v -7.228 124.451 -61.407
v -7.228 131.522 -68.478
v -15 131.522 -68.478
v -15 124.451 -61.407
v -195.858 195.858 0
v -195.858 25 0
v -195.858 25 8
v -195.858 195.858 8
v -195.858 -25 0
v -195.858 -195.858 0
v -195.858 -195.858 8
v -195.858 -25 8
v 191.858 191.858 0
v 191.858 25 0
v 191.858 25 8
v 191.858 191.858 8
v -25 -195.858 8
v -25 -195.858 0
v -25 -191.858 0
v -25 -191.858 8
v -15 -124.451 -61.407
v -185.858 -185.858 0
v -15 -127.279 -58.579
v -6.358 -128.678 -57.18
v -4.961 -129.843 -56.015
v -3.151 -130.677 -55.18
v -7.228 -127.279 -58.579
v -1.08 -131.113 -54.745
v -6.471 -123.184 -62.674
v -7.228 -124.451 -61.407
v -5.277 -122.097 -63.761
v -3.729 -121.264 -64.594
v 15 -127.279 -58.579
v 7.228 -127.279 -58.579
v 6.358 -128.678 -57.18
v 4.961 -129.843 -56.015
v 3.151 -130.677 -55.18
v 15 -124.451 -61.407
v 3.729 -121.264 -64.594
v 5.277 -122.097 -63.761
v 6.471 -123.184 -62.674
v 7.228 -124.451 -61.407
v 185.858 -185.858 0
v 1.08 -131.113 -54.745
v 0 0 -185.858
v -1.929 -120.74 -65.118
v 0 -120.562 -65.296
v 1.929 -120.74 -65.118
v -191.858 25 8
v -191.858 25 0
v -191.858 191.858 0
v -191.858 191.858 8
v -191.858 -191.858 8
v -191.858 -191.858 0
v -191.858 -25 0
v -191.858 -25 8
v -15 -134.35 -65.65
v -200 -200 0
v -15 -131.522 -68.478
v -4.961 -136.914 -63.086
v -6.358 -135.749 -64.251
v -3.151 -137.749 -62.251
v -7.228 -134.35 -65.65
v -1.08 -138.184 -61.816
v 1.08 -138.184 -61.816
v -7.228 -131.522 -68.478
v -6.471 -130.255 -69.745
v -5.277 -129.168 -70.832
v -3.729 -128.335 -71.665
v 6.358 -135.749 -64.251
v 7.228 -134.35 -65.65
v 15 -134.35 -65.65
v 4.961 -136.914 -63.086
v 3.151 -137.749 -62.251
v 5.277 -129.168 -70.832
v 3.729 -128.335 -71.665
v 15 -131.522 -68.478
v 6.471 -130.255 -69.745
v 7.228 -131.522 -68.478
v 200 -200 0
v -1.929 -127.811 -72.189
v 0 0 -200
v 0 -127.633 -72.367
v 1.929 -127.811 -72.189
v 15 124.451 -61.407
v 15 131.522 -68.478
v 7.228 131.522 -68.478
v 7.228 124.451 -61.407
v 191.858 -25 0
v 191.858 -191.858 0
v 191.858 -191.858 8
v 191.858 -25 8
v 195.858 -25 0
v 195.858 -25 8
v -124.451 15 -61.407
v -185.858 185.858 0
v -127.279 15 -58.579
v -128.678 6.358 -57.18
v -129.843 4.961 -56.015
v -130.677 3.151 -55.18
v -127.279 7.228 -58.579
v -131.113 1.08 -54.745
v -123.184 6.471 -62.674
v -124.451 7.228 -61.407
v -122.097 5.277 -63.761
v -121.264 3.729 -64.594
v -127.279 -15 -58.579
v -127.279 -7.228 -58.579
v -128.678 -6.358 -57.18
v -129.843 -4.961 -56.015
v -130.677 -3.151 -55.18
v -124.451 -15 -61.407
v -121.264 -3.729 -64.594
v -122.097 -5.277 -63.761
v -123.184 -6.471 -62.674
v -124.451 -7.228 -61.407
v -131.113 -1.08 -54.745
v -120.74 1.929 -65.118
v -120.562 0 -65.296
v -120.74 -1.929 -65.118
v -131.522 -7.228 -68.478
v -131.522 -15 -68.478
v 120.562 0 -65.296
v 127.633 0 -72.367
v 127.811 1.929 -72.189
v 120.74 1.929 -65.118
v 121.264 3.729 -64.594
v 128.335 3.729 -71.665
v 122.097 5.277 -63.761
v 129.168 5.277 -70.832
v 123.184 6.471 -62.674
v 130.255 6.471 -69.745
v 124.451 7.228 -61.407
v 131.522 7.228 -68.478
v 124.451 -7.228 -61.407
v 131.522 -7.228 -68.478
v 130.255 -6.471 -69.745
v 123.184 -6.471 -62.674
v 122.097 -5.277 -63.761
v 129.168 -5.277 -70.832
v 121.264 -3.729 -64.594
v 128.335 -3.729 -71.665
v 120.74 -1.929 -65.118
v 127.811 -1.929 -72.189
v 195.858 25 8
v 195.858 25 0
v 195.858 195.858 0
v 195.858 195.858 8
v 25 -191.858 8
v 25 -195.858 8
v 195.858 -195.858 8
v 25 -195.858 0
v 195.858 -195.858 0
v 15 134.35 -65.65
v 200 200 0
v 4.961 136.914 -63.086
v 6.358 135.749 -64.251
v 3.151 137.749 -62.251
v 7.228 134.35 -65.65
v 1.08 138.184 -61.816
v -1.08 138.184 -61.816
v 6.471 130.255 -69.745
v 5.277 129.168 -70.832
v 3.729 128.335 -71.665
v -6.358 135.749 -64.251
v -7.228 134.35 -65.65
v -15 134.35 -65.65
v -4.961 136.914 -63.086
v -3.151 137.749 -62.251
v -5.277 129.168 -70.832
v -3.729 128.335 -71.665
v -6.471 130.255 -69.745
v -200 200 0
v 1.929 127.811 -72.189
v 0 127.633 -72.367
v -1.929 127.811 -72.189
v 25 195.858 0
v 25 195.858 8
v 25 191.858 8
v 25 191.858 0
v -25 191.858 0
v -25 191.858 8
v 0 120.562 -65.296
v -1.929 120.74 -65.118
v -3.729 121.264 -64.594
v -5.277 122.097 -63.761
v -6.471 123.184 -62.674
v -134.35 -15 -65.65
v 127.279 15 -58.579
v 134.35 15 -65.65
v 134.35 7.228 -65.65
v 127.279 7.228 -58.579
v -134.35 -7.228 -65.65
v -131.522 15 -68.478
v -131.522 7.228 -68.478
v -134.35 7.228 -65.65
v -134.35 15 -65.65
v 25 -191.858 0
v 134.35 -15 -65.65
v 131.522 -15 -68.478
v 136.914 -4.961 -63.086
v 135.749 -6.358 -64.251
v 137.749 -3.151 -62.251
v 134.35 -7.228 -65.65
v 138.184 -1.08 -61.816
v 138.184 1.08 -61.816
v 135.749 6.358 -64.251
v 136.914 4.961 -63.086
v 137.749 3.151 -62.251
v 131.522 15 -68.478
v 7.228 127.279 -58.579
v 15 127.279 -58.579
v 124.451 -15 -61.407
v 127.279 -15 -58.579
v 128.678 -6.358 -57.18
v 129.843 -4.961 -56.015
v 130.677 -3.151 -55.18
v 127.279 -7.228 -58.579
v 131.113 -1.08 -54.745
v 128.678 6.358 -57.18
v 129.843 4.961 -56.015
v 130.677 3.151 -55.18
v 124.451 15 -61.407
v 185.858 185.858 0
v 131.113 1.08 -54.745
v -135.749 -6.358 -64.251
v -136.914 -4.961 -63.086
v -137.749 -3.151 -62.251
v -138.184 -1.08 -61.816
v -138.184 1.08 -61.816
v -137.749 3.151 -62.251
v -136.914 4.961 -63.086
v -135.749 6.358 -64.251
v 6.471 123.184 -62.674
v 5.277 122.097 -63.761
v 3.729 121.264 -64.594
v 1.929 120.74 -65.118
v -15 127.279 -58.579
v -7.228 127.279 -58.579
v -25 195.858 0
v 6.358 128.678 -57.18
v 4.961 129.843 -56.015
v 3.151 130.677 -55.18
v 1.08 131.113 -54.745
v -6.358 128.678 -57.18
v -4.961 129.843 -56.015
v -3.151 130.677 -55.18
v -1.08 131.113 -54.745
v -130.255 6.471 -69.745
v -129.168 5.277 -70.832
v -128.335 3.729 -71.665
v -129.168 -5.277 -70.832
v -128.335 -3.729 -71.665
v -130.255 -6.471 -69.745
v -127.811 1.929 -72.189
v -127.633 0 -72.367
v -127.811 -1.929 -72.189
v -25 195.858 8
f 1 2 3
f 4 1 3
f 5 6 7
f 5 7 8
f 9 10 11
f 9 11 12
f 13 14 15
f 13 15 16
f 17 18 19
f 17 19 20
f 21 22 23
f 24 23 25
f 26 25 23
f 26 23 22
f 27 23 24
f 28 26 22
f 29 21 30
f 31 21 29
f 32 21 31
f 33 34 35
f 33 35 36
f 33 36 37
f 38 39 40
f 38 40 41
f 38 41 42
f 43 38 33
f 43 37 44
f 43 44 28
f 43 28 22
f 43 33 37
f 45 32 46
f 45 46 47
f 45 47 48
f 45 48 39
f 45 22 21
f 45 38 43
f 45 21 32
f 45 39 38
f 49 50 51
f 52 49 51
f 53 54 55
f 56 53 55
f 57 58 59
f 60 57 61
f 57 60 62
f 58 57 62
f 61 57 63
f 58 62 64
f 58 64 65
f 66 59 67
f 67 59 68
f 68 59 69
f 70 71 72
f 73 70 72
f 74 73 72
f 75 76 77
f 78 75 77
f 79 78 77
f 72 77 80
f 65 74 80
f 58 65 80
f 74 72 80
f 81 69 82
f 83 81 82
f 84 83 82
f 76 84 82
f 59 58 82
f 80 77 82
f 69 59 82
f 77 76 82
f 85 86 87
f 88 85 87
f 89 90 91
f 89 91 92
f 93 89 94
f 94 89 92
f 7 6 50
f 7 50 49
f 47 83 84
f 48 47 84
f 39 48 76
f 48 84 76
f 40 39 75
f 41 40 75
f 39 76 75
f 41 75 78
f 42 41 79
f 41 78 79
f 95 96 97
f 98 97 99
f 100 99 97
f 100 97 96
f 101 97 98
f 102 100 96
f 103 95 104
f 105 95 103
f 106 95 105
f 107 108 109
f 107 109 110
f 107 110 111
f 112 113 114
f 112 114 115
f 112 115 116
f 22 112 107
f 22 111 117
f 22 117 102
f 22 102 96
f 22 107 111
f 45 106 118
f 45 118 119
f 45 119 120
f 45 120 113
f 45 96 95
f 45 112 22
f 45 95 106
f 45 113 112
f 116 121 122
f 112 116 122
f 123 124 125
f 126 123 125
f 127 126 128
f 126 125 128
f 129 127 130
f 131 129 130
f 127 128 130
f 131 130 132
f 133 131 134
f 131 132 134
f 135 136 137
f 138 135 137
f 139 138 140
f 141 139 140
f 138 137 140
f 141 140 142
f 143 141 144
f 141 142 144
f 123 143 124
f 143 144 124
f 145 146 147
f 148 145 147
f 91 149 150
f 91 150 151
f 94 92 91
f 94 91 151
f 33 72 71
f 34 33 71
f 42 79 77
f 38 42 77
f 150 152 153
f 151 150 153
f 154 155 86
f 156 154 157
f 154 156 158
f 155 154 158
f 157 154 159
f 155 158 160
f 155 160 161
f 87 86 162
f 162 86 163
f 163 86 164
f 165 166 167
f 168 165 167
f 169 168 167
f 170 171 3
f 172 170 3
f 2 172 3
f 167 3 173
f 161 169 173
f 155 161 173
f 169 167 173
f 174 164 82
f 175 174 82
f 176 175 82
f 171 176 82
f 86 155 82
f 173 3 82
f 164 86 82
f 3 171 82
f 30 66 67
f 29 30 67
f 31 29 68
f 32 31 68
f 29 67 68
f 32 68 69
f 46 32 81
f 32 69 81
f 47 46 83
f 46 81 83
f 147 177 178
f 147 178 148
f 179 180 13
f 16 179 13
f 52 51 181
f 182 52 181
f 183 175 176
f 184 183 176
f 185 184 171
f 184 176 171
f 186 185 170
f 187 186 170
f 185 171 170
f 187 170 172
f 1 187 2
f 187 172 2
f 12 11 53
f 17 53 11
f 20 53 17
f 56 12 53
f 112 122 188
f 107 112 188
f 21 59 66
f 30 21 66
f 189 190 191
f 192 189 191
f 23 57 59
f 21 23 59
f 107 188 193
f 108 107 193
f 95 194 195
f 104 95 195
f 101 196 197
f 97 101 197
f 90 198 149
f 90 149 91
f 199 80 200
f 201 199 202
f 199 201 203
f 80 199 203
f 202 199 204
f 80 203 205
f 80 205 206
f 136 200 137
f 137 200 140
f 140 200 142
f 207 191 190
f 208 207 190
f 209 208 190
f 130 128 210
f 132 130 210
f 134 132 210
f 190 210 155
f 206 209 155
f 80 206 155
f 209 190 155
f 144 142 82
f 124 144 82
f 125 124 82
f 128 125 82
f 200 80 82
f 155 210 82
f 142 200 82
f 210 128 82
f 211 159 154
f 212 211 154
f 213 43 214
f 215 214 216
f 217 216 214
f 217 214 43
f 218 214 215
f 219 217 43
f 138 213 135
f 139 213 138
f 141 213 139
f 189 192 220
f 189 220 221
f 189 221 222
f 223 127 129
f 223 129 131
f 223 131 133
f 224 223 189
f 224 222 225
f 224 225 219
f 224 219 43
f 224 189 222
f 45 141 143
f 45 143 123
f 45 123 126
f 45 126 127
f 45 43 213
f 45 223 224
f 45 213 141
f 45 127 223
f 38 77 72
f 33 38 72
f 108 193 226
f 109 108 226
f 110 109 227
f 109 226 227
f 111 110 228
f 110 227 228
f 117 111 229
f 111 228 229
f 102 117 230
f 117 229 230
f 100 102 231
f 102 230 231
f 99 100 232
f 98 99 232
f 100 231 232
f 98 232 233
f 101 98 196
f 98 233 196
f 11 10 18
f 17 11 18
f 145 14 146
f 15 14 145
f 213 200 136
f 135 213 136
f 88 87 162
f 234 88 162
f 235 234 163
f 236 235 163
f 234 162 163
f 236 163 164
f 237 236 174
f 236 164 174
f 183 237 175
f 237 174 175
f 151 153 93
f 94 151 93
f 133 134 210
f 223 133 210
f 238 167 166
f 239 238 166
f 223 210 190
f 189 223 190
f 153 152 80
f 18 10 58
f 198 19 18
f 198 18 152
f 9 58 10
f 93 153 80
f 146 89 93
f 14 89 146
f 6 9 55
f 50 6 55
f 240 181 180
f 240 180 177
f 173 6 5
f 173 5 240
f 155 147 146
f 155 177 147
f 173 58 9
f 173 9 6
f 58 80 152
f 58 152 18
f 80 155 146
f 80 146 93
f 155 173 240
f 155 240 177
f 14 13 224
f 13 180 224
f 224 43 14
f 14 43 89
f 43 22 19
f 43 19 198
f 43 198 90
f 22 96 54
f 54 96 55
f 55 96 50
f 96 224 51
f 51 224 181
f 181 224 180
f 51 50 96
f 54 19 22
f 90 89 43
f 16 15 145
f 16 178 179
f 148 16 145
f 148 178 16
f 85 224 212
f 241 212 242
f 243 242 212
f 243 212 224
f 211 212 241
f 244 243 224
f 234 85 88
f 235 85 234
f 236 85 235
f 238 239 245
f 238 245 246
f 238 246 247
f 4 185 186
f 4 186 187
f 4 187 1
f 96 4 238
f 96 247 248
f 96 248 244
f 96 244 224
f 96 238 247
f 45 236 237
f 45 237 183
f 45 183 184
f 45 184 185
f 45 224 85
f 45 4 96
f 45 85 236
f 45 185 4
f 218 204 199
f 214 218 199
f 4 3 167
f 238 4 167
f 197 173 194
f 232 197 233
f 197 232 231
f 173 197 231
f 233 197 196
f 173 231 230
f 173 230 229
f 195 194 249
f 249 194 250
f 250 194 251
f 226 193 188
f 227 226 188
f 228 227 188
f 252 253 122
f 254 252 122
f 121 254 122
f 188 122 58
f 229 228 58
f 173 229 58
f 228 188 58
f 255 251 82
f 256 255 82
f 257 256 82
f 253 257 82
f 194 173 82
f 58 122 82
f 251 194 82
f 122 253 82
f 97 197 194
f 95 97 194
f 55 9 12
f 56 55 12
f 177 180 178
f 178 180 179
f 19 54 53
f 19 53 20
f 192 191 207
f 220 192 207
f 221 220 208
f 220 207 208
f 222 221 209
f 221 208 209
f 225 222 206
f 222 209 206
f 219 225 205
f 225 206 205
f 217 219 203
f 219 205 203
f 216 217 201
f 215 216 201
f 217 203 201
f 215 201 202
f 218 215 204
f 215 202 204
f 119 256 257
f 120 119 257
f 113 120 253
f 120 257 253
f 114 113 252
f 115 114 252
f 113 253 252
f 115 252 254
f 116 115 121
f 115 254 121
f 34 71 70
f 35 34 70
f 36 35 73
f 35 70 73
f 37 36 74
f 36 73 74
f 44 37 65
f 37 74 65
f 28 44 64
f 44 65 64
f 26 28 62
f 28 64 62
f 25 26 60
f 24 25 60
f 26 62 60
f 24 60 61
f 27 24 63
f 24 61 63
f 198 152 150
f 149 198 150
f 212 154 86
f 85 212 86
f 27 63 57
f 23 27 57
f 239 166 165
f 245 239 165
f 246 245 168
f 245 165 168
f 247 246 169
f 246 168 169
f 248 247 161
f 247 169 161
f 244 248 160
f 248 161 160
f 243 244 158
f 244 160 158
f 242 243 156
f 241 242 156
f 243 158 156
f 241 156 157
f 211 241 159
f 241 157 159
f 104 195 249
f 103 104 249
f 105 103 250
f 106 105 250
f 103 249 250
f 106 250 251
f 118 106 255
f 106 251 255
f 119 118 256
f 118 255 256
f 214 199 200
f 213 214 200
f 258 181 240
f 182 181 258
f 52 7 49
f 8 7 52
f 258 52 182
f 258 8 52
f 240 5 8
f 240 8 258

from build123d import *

# Parameters (mm, degrees)
F0_W      = 400
F0_H      = 400
F3_T      = -10
F4_W      = 391.7157287525
F4_H      = 391.7157287525
F4_W_2    = 383.7157287525
F4_H_2    = 383.7157287525
F5_DEPTH  = 8
F10_DEPTH = 288.5005667948
F11_DEPTH = 288.5005667948
F12_DEPTH = 288.5005667948
F13_DEPTH = 288.5005667948
F14_W     = 25
F14_H     = 8
F15_DEPTH = 395.8588644763
F16_W     = 25
F16_H     = 8
F17_DEPTH = 395.8588644763


with BuildPart() as f2:
    # F0 (on Top) → F2 section 0
    with BuildSketch(Plane.XY, mode=Mode.PRIVATE) as f2_s0:
        Rectangle(F0_W, F0_H)
    loft([f2_s0.sketch, Vertex(0, 0, -200)])

    # F3
    f3_openings = [f2.faces().sort_by_distance(p)[0] for p in [
        (0, 0, 0),
    ]]
    offset(amount=F3_T, openings=f3_openings)

    # F4 (on face) → F5 (join)
    with BuildSketch(Plane.XY):
        Rectangle(F4_W, F4_H)
        Rectangle(F4_W_2, F4_H_2, mode=Mode.SUBTRACT)
    extrude(amount=F5_DEPTH)

    # F6 (on face) → F10 (cut, through all)
    with BuildSketch(Plane(origin=(0, -100, -100), x_dir=(1, 0, 0), z_dir=(0, -0.7071067812, -0.7071067812))):
        with BuildLine():
            ThreePointArc((-7.2284161474, 44.5786437627), (-4.5414755311, 40.6099755695), (0, 39.0786437627))
            Line((0, 39.0786437627), (0, 44.5786437627))
            Line((0, 44.5786437627), (-7.2284161474, 44.5786437627))
        make_face()
        with BuildLine():
            Line((0, 44.5786437627), (0, 39.0786437627))
            ThreePointArc((0, 39.0786437627), (4.5414755311, 40.6099755695), (7.2284161474, 44.5786437627))
            Line((7.2284161474, 44.5786437627), (0, 44.5786437627))
        make_face()
        with BuildLine():
            Line((-7.2284161474, 44.5786437627), (0, 44.5786437627))
            Line((0, 44.5786437627), (0, 46.5786437627))
            Line((0, 46.5786437627), (7.5, 46.5786437627))
            ThreePointArc((7.5, 46.5786437627), (7.4317938987, 47.5878213721), (7.2284161474, 48.5786437627))
            Line((7.2284161474, 48.5786437627), (-7.2284161474, 48.5786437627))
            ThreePointArc((-7.2284161474, 48.5786437627), (-7.5, 46.5786437627), (-7.2284161474, 44.5786437627))
        make_face()
        with BuildLine():
            Line((0, 46.5786437627), (0, 44.5786437627))
            Line((0, 44.5786437627), (7.2284161474, 44.5786437627))
            ThreePointArc((7.2284161474, 44.5786437627), (7.4317938987, 45.5694661533), (7.5, 46.5786437627))
            Line((7.5, 46.5786437627), (0, 46.5786437627))
        make_face()
        with BuildLine():
            Line((-15, 44.5786437627), (-7.2284161474, 44.5786437627))
            ThreePointArc((-7.2284161474, 44.5786437627), (-7.5, 46.5786437627), (-7.2284161474, 48.5786437627))
            Line((-7.2284161474, 48.5786437627), (-15, 48.5786437627))
            Line((-15, 48.5786437627), (-15, 44.5786437627))
        make_face()
        with BuildLine():
            ThreePointArc((7.5, 46.5786437627), (7.4317938987, 45.5694661533), (7.2284161474, 44.5786437627))
            Line((7.2284161474, 44.5786437627), (15, 44.5786437627))
            Line((15, 44.5786437627), (15, 48.5786437627))
            Line((15, 48.5786437627), (7.2284161474, 48.5786437627))
            ThreePointArc((7.2284161474, 48.5786437627), (7.4317938987, 47.5878213721), (7.5, 46.5786437627))
        make_face()
        with BuildLine():
            ThreePointArc((7.2284161474, 48.5786437627), (0, 54.0786437627), (-7.2284161474, 48.5786437627))
            Line((-7.2284161474, 48.5786437627), (7.2284161474, 48.5786437627))
        make_face()
    extrude(amount=-F10_DEPTH, mode=Mode.SUBTRACT)

    # F7 (on face) → F11 (cut, through all)
    with BuildSketch(Plane(origin=(100, 0, -100), x_dir=(0, 1, 0), z_dir=(0.7071067812, 0, -0.7071067812))):
        with BuildLine():
            ThreePointArc((-7.2284161474, 44.5786437627), (-4.5414755311, 40.6099755695), (0, 39.0786437627))
            Line((0, 39.0786437627), (0, 44.5786437627))
            Line((0, 44.5786437627), (-7.2284161474, 44.5786437627))
        make_face()
        with BuildLine():
            Line((0, 44.5786437627), (0, 39.0786437627))
            ThreePointArc((0, 39.0786437627), (4.5414755311, 40.6099755695), (7.2284161474, 44.5786437627))
            Line((7.2284161474, 44.5786437627), (0, 44.5786437627))
        make_face()
        with BuildLine():
            Line((-7.2284161474, 44.5786437627), (0, 44.5786437627))
            Line((0, 44.5786437627), (0, 46.5786437627))
            Line((0, 46.5786437627), (7.5, 46.5786437627))
            ThreePointArc((7.5, 46.5786437627), (7.4317938987, 47.5878213721), (7.2284161474, 48.5786437627))
            Line((7.2284161474, 48.5786437627), (-7.2284161474, 48.5786437627))
            ThreePointArc((-7.2284161474, 48.5786437627), (-7.5, 46.5786437627), (-7.2284161474, 44.5786437627))
        make_face()
        with BuildLine():
            Line((0, 46.5786437627), (0, 44.5786437627))
            Line((0, 44.5786437627), (7.2284161474, 44.5786437627))
            ThreePointArc((7.2284161474, 44.5786437627), (7.4317938987, 45.5694661533), (7.5, 46.5786437627))
            Line((7.5, 46.5786437627), (0, 46.5786437627))
        make_face()
        with BuildLine():
            Line((-15, 44.5786437627), (-7.2284161474, 44.5786437627))
            ThreePointArc((-7.2284161474, 44.5786437627), (-7.5, 46.5786437627), (-7.2284161474, 48.5786437627))
            Line((-7.2284161474, 48.5786437627), (-15, 48.5786437627))
            Line((-15, 48.5786437627), (-15, 44.5786437627))
        make_face()
        with BuildLine():
            ThreePointArc((7.5, 46.5786437627), (7.4317938987, 45.5694661533), (7.2284161474, 44.5786437627))
            Line((7.2284161474, 44.5786437627), (15, 44.5786437627))
            Line((15, 44.5786437627), (15, 48.5786437627))
            Line((15, 48.5786437627), (7.2284161474, 48.5786437627))
            ThreePointArc((7.2284161474, 48.5786437627), (7.4317938987, 47.5878213721), (7.5, 46.5786437627))
        make_face()
        with BuildLine():
            ThreePointArc((7.2284161474, 48.5786437627), (0, 54.0786437627), (-7.2284161474, 48.5786437627))
            Line((-7.2284161474, 48.5786437627), (7.2284161474, 48.5786437627))
        make_face()
    extrude(amount=-F11_DEPTH, mode=Mode.SUBTRACT)

    # F8 (on face) → F12 (cut, through all)
    with BuildSketch(Plane(origin=(0, 100, -100), x_dir=(-1, 0, 0), z_dir=(0, 0.7071067812, -0.7071067812))):
        with BuildLine():
            ThreePointArc((-7.2284161474, 44.5786437627), (-4.5414755311, 40.6099755695), (0, 39.0786437627))
            Line((0, 39.0786437627), (0, 44.5786437627))
            Line((0, 44.5786437627), (-7.2284161474, 44.5786437627))
        make_face()
        with BuildLine():
            Line((0, 44.5786437627), (0, 39.0786437627))
            ThreePointArc((0, 39.0786437627), (4.5414755311, 40.6099755695), (7.2284161474, 44.5786437627))
            Line((7.2284161474, 44.5786437627), (0, 44.5786437627))
        make_face()
        with BuildLine():
            Line((-7.2284161474, 44.5786437627), (0, 44.5786437627))
            Line((0, 44.5786437627), (0, 46.5786437627))
            Line((0, 46.5786437627), (7.5, 46.5786437627))
            ThreePointArc((7.5, 46.5786437627), (7.4317938987, 47.5878213721), (7.2284161474, 48.5786437627))
            Line((7.2284161474, 48.5786437627), (-7.2284161474, 48.5786437627))
            ThreePointArc((-7.2284161474, 48.5786437627), (-7.5, 46.5786437627), (-7.2284161474, 44.5786437627))
        make_face()
        with BuildLine():
            Line((0, 46.5786437627), (0, 44.5786437627))
            Line((0, 44.5786437627), (7.2284161474, 44.5786437627))
            ThreePointArc((7.2284161474, 44.5786437627), (7.4317938987, 45.5694661533), (7.5, 46.5786437627))
            Line((7.5, 46.5786437627), (0, 46.5786437627))
        make_face()
        with BuildLine():
            Line((-15, 44.5786437627), (-7.2284161474, 44.5786437627))
            ThreePointArc((-7.2284161474, 44.5786437627), (-7.5, 46.5786437627), (-7.2284161474, 48.5786437627))
            Line((-7.2284161474, 48.5786437627), (-15, 48.5786437627))
            Line((-15, 48.5786437627), (-15, 44.5786437627))
        make_face()
        with BuildLine():
            ThreePointArc((7.5, 46.5786437627), (7.4317938987, 45.5694661533), (7.2284161474, 44.5786437627))
            Line((7.2284161474, 44.5786437627), (15, 44.5786437627))
            Line((15, 44.5786437627), (15, 48.5786437627))
            Line((15, 48.5786437627), (7.2284161474, 48.5786437627))
            ThreePointArc((7.2284161474, 48.5786437627), (7.4317938987, 47.5878213721), (7.5, 46.5786437627))
        make_face()
        with BuildLine():
            ThreePointArc((7.2284161474, 48.5786437627), (0, 54.0786437627), (-7.2284161474, 48.5786437627))
            Line((-7.2284161474, 48.5786437627), (7.2284161474, 48.5786437627))
        make_face()
    extrude(amount=-F12_DEPTH, mode=Mode.SUBTRACT)

    # F9 (on face) → F13 (cut, through all)
    with BuildSketch(Plane(origin=(-100, 0, -100), x_dir=(0.7071067812, 0, -0.7071067812), z_dir=(-0.7071067812, 0, -0.7071067812))):
        with BuildLine():
            ThreePointArc((-44.5786437627, -7.2284161474), (-40.6099755695, -4.5414755311), (-39.0786437627, 0))
            Line((-39.0786437627, 0), (-44.5786437627, 0))
            Line((-44.5786437627, 0), (-44.5786437627, -7.2284161474))
        make_face()
        with BuildLine():
            Line((-44.5786437627, 0), (-39.0786437627, 0))
            ThreePointArc((-39.0786437627, 0), (-40.6099755695, 4.5414755311), (-44.5786437627, 7.2284161474))
            Line((-44.5786437627, 7.2284161474), (-44.5786437627, 0))
        make_face()
        with BuildLine():
            Line((-44.5786437627, -7.2284161474), (-44.5786437627, 0))
            Line((-44.5786437627, 0), (-44.5786437627, 7.2284161474))
            ThreePointArc((-44.5786437627, 7.2284161474), (-46.5786437627, 7.5), (-48.5786437627, 7.2284161474))
            Line((-48.5786437627, 7.2284161474), (-48.5786437627, -7.2284161474))
            ThreePointArc((-48.5786437627, -7.2284161474), (-46.5786437627, -7.5), (-44.5786437627, -7.2284161474))
        make_face()
        with BuildLine():
            ThreePointArc((-48.5786437627, 7.2284161474), (-46.5786437627, 7.5), (-44.5786437627, 7.2284161474))
            Line((-44.5786437627, 7.2284161474), (-44.5786437627, 15))
            Line((-44.5786437627, 15), (-48.5786437627, 15))
            Line((-48.5786437627, 15), (-48.5786437627, 7.2284161474))
        make_face()
        with BuildLine():
            Line((-44.5786437627, -15), (-44.5786437627, -7.2284161474))
            ThreePointArc((-44.5786437627, -7.2284161474), (-46.5786437627, -7.5), (-48.5786437627, -7.2284161474))
            Line((-48.5786437627, -7.2284161474), (-48.5786437627, -15))
            Line((-48.5786437627, -15), (-44.5786437627, -15))
        make_face()
        with BuildLine():
            Line((-48.5786437627, -7.2284161474), (-48.5786437627, 7.2284161474))
            ThreePointArc((-48.5786437627, 7.2284161474), (-54.0786437627, 0), (-48.5786437627, -7.2284161474))
        make_face()
    extrude(amount=-F13_DEPTH, mode=Mode.SUBTRACT)

    # F14 (on face) → F15 (cut, through all)
    with BuildSketch(Plane.XZ.offset(195.8578643763)):
        with Locations((-12.5, 4)):
            Rectangle(F14_W, F14_H)
        with Locations((12.5, 4)):
            Rectangle(F14_W, F14_H)
    extrude(amount=-F15_DEPTH, mode=Mode.SUBTRACT)

    # F16 (on face) → F17 (cut, through all)
    with BuildSketch(Plane(origin=(-195.8578643763, 0, 0), x_dir=(0, -1, 0), z_dir=(-1, 0, 0))):
        with Locations((-12.5, 4)):
            Rectangle(F16_W, F16_H)
        with Locations((12.5, 4)):
            Rectangle(F16_W, F16_H)
    extrude(amount=-F17_DEPTH, mode=Mode.SUBTRACT)


solid = f2.part
